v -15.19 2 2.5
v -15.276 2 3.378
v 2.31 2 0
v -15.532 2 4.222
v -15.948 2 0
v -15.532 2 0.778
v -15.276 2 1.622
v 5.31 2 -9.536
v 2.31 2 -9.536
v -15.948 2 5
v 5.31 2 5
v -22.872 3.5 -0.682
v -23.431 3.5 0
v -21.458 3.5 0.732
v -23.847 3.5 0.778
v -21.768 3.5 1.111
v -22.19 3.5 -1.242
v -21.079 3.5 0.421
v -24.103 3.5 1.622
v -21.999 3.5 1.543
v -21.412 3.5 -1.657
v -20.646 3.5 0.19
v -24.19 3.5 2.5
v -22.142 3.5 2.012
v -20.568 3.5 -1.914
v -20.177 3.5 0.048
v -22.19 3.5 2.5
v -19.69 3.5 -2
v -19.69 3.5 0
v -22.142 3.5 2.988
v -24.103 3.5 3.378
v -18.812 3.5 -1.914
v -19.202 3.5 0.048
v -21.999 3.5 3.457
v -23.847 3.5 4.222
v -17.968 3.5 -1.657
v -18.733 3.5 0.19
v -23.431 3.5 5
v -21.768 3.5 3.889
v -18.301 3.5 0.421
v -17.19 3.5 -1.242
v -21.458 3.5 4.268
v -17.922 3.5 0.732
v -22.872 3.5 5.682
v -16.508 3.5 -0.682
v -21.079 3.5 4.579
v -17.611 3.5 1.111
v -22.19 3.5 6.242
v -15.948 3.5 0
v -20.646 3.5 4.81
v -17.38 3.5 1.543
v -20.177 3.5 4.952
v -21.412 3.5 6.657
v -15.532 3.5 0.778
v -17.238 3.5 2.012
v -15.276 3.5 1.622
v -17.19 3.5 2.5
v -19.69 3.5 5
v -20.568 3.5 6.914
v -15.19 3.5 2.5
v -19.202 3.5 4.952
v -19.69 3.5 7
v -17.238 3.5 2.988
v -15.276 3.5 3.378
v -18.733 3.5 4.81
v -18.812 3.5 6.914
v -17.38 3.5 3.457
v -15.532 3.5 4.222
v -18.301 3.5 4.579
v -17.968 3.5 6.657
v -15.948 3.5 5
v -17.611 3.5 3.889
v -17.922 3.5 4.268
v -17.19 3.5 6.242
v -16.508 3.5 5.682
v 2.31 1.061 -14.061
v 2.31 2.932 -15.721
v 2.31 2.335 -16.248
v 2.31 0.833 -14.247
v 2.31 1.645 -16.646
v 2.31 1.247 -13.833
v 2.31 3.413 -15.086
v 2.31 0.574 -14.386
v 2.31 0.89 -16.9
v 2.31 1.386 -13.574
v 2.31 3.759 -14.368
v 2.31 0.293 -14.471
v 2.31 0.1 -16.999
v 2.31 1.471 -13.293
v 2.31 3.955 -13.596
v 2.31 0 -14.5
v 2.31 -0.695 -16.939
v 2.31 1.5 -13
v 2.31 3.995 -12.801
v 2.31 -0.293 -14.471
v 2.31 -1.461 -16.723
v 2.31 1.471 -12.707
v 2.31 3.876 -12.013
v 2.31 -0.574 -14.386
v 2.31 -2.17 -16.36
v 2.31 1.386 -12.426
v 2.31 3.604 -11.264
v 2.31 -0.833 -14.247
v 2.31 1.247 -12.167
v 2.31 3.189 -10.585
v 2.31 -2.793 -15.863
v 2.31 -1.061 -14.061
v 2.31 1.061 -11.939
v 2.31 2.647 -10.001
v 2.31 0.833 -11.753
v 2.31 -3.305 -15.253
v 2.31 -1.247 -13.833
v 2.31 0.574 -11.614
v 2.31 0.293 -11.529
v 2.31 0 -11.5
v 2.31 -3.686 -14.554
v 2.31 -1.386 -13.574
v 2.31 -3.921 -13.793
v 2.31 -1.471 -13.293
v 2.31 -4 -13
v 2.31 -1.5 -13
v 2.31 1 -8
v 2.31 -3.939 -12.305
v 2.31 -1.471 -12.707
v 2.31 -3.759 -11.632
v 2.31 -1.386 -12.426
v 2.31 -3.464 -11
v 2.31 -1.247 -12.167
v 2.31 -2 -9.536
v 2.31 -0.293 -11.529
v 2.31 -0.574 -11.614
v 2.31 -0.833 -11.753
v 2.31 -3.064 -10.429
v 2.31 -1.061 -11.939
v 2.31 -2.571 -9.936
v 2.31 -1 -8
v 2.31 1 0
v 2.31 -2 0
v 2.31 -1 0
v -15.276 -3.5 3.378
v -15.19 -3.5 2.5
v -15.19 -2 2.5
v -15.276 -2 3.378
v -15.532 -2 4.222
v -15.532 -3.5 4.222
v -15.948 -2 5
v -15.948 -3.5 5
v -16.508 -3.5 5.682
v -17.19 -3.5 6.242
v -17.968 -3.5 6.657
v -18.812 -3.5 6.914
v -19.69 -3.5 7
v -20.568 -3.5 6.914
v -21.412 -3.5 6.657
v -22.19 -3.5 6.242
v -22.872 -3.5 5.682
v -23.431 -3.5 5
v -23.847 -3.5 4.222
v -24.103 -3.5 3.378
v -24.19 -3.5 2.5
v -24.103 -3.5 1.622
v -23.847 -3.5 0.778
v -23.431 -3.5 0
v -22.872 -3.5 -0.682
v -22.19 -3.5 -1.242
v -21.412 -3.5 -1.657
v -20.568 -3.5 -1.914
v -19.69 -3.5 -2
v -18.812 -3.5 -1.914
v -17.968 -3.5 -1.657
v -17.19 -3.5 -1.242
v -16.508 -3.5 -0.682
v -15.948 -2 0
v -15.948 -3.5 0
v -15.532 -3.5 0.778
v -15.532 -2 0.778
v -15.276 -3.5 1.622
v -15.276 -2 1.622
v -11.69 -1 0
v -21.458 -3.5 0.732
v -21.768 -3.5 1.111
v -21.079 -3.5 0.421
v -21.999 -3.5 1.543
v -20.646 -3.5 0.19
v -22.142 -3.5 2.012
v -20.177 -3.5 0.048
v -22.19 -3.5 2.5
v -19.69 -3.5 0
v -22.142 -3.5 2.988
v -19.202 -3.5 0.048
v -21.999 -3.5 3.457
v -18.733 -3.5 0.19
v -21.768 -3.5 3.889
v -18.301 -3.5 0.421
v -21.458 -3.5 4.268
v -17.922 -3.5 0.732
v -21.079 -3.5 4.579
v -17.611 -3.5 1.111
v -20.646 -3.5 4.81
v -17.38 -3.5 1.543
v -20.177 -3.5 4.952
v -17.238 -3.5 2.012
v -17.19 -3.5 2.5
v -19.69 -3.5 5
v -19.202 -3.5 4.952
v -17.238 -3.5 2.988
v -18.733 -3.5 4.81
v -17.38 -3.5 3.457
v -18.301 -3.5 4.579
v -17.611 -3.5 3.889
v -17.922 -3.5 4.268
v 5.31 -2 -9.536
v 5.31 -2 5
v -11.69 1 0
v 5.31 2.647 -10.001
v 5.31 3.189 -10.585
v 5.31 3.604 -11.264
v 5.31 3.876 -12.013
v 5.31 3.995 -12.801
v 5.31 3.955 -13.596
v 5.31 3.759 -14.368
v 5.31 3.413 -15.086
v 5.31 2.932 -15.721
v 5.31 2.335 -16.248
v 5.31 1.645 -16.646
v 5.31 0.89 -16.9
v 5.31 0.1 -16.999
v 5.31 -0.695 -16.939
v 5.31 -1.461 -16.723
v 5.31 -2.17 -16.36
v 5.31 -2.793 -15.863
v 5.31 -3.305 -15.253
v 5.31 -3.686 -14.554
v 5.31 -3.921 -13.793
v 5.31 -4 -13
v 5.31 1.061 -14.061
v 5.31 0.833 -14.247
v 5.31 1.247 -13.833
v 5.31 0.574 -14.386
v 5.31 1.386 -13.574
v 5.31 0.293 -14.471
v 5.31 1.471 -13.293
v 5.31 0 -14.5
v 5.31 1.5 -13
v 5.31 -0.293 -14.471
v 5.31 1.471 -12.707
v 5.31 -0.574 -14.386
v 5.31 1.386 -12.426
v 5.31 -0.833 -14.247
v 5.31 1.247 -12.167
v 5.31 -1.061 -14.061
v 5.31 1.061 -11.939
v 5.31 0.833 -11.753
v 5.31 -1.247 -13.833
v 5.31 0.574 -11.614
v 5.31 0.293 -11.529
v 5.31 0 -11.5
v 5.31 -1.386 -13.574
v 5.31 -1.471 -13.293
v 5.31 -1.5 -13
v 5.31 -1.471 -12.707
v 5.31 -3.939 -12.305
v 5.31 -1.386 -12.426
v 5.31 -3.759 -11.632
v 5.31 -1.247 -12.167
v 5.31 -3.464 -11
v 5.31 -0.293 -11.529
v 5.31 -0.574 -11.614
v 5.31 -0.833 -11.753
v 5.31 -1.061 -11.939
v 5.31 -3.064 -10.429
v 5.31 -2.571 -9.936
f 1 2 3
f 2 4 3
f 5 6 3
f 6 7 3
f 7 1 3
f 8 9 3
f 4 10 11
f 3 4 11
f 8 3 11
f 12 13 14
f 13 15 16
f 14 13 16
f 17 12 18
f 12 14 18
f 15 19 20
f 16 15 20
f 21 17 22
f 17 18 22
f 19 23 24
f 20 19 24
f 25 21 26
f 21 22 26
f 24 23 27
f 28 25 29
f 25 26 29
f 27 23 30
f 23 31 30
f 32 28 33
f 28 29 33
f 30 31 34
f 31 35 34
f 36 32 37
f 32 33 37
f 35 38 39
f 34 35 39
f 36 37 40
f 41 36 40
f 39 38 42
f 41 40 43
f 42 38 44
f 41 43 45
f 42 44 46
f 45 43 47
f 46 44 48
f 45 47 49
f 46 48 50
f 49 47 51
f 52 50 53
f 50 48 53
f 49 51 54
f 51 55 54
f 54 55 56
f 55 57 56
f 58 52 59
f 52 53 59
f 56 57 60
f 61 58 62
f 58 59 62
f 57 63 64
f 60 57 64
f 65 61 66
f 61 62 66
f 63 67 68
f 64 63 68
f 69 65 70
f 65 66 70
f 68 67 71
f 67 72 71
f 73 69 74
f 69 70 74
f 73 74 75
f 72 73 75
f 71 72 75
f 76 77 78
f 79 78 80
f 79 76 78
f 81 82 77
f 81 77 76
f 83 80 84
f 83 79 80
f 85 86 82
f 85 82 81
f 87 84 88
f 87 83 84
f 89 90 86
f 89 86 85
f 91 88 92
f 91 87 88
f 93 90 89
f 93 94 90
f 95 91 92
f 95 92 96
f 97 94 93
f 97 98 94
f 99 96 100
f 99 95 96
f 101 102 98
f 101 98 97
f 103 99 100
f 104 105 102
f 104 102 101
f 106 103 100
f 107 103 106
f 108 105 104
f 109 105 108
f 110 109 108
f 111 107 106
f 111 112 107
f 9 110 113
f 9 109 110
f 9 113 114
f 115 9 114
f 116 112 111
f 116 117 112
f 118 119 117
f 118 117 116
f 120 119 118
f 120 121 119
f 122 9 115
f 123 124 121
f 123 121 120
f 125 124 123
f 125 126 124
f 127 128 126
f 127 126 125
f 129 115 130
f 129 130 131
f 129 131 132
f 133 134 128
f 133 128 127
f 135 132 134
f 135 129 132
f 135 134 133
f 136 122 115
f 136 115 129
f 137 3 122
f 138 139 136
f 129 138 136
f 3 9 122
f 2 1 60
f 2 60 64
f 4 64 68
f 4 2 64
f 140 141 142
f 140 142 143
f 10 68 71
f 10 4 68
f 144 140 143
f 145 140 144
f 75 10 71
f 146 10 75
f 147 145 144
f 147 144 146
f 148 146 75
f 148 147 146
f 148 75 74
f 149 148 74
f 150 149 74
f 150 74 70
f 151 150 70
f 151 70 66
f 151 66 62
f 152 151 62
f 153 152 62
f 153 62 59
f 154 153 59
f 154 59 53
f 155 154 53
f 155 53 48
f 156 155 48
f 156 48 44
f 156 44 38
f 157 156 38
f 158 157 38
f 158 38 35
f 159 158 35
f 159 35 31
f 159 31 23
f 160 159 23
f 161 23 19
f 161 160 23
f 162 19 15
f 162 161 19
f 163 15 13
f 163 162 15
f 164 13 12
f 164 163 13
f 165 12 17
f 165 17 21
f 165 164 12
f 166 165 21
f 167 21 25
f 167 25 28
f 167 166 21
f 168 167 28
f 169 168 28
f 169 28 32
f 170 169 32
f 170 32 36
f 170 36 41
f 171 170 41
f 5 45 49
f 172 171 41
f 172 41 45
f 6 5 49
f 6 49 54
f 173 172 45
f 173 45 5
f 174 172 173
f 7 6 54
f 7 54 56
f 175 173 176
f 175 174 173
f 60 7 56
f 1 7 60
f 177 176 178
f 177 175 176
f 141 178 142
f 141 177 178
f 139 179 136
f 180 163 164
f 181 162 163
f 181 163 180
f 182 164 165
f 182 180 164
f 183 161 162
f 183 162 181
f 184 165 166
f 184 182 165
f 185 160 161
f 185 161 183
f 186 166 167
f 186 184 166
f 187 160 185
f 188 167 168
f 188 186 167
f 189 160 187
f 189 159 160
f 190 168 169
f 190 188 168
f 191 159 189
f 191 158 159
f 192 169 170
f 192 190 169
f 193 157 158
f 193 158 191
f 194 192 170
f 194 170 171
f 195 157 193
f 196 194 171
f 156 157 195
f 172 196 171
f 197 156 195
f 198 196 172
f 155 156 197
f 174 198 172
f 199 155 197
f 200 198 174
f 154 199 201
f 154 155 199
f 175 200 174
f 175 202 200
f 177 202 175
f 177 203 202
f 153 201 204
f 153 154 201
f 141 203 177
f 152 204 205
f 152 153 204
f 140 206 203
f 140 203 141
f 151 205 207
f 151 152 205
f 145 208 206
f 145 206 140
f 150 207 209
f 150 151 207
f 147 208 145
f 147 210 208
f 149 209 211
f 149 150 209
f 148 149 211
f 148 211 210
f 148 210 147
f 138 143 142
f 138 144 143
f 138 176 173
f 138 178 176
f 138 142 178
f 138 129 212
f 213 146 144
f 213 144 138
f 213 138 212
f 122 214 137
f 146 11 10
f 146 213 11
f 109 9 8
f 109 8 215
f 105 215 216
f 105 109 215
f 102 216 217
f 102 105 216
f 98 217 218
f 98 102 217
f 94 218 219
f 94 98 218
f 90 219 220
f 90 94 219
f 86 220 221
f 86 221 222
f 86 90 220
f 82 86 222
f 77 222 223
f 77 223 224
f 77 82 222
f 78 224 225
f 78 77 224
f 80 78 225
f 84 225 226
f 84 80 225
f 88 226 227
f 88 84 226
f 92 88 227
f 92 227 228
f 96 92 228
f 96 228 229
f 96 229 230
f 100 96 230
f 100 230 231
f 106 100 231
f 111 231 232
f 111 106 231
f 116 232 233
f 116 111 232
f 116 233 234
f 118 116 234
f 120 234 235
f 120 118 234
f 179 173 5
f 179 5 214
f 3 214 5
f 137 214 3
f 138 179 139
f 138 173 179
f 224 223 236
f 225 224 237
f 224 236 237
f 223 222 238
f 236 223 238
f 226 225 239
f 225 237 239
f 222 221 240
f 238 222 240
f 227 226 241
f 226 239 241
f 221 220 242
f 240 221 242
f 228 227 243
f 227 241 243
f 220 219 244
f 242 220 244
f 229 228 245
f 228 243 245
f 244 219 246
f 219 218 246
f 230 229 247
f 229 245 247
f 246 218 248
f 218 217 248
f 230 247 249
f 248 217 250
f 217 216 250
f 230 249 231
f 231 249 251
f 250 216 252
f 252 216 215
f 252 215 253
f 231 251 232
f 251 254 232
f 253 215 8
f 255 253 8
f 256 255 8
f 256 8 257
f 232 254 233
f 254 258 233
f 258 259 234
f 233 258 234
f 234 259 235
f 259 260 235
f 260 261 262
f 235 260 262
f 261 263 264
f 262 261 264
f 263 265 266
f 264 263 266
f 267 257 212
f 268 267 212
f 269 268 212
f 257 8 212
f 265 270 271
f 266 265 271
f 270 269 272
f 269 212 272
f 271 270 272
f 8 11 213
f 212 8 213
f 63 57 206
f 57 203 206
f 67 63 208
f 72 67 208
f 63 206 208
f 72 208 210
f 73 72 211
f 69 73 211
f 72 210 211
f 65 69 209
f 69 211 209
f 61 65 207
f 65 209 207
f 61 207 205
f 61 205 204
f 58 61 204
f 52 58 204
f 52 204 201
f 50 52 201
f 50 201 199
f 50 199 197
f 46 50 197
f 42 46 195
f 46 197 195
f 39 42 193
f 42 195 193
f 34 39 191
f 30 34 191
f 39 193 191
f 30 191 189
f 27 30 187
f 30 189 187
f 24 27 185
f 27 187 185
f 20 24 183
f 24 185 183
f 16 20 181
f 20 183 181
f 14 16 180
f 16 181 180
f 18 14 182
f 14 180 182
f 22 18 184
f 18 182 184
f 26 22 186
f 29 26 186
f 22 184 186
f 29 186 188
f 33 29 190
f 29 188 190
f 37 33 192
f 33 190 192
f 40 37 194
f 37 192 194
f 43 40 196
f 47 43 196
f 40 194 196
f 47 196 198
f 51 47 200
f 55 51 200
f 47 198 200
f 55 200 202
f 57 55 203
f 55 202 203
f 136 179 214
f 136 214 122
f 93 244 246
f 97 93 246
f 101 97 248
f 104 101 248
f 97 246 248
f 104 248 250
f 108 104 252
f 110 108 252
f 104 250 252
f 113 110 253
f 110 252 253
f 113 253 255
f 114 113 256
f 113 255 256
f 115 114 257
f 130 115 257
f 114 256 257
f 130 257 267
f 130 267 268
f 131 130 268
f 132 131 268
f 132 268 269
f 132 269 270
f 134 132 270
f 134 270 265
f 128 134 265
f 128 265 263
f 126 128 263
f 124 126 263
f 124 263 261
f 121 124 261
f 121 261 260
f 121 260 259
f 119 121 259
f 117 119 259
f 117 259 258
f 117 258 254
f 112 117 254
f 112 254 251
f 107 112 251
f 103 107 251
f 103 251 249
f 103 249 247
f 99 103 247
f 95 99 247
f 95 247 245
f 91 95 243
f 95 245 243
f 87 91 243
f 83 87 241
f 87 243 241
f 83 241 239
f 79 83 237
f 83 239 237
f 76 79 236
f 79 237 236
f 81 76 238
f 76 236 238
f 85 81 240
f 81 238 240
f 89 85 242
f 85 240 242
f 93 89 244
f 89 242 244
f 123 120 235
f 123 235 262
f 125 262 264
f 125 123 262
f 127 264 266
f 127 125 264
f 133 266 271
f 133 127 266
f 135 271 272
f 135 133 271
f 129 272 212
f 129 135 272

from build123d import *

# Parameters (mm, degrees)
F0_R     = 2.5
F1_DEPTH = 3.5
F2_DEPTH = 2
F4_DEPTH = 3
F6_D     = 3
F8_DEPTH = 1


with BuildPart() as f1:
    # F0 (on Front) → F1 (new body, symmetric)
    with BuildSketch(Plane.XZ):
        with BuildLine():
            Line((-15.9480972197, 5), (-16.6897546064, 5))
            Line((-16.6897546064, 5), (-16.6897546064, 0))
            Line((-16.6897546064, 0), (-15.9480972197, 0))
            ThreePointArc((-15.9480972197, 0), (-15.3835115664, 1.1937569599), (-15.1897546064, 2.5))
            ThreePointArc((-15.1897546064, 2.5), (-15.3835115664, 3.8062430401), (-15.9480972197, 5))
        make_face()
        with BuildLine():
            Line((-16.6897546064, 0), (-16.6897546064, 5))
            Line((-16.6897546064, 5), (-15.9480972197, 5))
            ThreePointArc((-15.9480972197, 5), (-24.1897546064, 2.5), (-15.9480972197, 0))
            Line((-15.9480972197, 0), (-16.6897546064, 0))
        make_face()
        with Locations((-19.6897546064, 2.5)):
            Circle(F0_R, mode=Mode.SUBTRACT)
    extrude(amount=F1_DEPTH, both=True)

    # F0 (on Front) → F2 (join, symmetric)
    with BuildSketch(Plane.XZ):
        with BuildLine():
            Line((-16.6897546064, 0), (-16.6897546064, 5))
            Line((-16.6897546064, 5), (-15.9480972197, 5))
            ThreePointArc((-15.9480972197, 5), (-24.1897546064, 2.5), (-15.9480972197, 0))
            Line((-15.9480972197, 0), (-16.6897546064, 0))
        make_face()
        with Locations((-19.6897546064, 2.5)):
            Circle(F0_R, mode=Mode.SUBTRACT)
        with BuildLine():
            Line((-15.9480972197, 5), (-16.6897546064, 5))
            Line((-16.6897546064, 5), (-16.6897546064, 0))
            Line((-16.6897546064, 0), (-15.9480972197, 0))
            ThreePointArc((-15.9480972197, 0), (-15.3835115664, 1.1937569599), (-15.1897546064, 2.5))
            ThreePointArc((-15.1897546064, 2.5), (-15.3835115664, 3.8062430401), (-15.9480972197, 5))
        make_face()
        with BuildLine():
            Line((5.3102453936, 5), (-15.9480972197, 5))
            ThreePointArc((-15.9480972197, 5), (-15.3835115664, 3.8062430401), (-15.1897546064, 2.5))
            ThreePointArc((-15.1897546064, 2.5), (-15.3835115664, 1.1937569599), (-15.9480972197, 0))
            Line((-15.9480972197, 0), (2.3102453936, 0))
            Line((2.3102453936, 0), (2.3102453936, -15))
            Line((2.3102453936, -15), (5.3102453936, -15))
            Line((5.3102453936, -15), (5.3102453936, 5))
        make_face()
    extrude(amount=F2_DEPTH, both=True)

    # F3 (on face) → F4 (join)
    with BuildSketch(Plane(origin=(2.3102453936, 0, 0), x_dir=(0, -1, 0), z_dir=(-1, 0, 0))):
        with BuildLine():
            ThreePointArc((-2, -9.5358983849), (-2, -16.4641016151), (4, -13))
            ThreePointArc((4, -13), (3.4641016151, -11), (2, -9.5358983849))
            Line((2, -9.5358983849), (2, -15))
            Line((2, -15), (-2, -15))
            Line((-2, -15), (-2, -9.5358983849))
        make_face()
        with BuildLine():
            Line((2, -15), (2, -9.5358983849))
            ThreePointArc((2, -9.5358983849), (0, -9), (-2, -9.5358983849))
            Line((-2, -9.5358983849), (-2, -15))
            Line((-2, -15), (2, -15))
        make_face()
    extrude(amount=-F4_DEPTH)

    # F6 (through all)
    with Locations(Plane(origin=(2.3102453936, 0, 0), x_dir=(0, -1, 0), z_dir=(-1, 0, 0))):
        with Locations((0, -13)):
            Hole(F6_D / 2)

    # F7 (on Front) → F8 (join, symmetric)
    with BuildSketch(Plane.XZ):
        Polygon((2.3102453936, 0), (-11.6897546064, 0), (2.3102453936, -8), align=None)
    extrude(amount=F8_DEPTH, both=True)


solid = f1.part
